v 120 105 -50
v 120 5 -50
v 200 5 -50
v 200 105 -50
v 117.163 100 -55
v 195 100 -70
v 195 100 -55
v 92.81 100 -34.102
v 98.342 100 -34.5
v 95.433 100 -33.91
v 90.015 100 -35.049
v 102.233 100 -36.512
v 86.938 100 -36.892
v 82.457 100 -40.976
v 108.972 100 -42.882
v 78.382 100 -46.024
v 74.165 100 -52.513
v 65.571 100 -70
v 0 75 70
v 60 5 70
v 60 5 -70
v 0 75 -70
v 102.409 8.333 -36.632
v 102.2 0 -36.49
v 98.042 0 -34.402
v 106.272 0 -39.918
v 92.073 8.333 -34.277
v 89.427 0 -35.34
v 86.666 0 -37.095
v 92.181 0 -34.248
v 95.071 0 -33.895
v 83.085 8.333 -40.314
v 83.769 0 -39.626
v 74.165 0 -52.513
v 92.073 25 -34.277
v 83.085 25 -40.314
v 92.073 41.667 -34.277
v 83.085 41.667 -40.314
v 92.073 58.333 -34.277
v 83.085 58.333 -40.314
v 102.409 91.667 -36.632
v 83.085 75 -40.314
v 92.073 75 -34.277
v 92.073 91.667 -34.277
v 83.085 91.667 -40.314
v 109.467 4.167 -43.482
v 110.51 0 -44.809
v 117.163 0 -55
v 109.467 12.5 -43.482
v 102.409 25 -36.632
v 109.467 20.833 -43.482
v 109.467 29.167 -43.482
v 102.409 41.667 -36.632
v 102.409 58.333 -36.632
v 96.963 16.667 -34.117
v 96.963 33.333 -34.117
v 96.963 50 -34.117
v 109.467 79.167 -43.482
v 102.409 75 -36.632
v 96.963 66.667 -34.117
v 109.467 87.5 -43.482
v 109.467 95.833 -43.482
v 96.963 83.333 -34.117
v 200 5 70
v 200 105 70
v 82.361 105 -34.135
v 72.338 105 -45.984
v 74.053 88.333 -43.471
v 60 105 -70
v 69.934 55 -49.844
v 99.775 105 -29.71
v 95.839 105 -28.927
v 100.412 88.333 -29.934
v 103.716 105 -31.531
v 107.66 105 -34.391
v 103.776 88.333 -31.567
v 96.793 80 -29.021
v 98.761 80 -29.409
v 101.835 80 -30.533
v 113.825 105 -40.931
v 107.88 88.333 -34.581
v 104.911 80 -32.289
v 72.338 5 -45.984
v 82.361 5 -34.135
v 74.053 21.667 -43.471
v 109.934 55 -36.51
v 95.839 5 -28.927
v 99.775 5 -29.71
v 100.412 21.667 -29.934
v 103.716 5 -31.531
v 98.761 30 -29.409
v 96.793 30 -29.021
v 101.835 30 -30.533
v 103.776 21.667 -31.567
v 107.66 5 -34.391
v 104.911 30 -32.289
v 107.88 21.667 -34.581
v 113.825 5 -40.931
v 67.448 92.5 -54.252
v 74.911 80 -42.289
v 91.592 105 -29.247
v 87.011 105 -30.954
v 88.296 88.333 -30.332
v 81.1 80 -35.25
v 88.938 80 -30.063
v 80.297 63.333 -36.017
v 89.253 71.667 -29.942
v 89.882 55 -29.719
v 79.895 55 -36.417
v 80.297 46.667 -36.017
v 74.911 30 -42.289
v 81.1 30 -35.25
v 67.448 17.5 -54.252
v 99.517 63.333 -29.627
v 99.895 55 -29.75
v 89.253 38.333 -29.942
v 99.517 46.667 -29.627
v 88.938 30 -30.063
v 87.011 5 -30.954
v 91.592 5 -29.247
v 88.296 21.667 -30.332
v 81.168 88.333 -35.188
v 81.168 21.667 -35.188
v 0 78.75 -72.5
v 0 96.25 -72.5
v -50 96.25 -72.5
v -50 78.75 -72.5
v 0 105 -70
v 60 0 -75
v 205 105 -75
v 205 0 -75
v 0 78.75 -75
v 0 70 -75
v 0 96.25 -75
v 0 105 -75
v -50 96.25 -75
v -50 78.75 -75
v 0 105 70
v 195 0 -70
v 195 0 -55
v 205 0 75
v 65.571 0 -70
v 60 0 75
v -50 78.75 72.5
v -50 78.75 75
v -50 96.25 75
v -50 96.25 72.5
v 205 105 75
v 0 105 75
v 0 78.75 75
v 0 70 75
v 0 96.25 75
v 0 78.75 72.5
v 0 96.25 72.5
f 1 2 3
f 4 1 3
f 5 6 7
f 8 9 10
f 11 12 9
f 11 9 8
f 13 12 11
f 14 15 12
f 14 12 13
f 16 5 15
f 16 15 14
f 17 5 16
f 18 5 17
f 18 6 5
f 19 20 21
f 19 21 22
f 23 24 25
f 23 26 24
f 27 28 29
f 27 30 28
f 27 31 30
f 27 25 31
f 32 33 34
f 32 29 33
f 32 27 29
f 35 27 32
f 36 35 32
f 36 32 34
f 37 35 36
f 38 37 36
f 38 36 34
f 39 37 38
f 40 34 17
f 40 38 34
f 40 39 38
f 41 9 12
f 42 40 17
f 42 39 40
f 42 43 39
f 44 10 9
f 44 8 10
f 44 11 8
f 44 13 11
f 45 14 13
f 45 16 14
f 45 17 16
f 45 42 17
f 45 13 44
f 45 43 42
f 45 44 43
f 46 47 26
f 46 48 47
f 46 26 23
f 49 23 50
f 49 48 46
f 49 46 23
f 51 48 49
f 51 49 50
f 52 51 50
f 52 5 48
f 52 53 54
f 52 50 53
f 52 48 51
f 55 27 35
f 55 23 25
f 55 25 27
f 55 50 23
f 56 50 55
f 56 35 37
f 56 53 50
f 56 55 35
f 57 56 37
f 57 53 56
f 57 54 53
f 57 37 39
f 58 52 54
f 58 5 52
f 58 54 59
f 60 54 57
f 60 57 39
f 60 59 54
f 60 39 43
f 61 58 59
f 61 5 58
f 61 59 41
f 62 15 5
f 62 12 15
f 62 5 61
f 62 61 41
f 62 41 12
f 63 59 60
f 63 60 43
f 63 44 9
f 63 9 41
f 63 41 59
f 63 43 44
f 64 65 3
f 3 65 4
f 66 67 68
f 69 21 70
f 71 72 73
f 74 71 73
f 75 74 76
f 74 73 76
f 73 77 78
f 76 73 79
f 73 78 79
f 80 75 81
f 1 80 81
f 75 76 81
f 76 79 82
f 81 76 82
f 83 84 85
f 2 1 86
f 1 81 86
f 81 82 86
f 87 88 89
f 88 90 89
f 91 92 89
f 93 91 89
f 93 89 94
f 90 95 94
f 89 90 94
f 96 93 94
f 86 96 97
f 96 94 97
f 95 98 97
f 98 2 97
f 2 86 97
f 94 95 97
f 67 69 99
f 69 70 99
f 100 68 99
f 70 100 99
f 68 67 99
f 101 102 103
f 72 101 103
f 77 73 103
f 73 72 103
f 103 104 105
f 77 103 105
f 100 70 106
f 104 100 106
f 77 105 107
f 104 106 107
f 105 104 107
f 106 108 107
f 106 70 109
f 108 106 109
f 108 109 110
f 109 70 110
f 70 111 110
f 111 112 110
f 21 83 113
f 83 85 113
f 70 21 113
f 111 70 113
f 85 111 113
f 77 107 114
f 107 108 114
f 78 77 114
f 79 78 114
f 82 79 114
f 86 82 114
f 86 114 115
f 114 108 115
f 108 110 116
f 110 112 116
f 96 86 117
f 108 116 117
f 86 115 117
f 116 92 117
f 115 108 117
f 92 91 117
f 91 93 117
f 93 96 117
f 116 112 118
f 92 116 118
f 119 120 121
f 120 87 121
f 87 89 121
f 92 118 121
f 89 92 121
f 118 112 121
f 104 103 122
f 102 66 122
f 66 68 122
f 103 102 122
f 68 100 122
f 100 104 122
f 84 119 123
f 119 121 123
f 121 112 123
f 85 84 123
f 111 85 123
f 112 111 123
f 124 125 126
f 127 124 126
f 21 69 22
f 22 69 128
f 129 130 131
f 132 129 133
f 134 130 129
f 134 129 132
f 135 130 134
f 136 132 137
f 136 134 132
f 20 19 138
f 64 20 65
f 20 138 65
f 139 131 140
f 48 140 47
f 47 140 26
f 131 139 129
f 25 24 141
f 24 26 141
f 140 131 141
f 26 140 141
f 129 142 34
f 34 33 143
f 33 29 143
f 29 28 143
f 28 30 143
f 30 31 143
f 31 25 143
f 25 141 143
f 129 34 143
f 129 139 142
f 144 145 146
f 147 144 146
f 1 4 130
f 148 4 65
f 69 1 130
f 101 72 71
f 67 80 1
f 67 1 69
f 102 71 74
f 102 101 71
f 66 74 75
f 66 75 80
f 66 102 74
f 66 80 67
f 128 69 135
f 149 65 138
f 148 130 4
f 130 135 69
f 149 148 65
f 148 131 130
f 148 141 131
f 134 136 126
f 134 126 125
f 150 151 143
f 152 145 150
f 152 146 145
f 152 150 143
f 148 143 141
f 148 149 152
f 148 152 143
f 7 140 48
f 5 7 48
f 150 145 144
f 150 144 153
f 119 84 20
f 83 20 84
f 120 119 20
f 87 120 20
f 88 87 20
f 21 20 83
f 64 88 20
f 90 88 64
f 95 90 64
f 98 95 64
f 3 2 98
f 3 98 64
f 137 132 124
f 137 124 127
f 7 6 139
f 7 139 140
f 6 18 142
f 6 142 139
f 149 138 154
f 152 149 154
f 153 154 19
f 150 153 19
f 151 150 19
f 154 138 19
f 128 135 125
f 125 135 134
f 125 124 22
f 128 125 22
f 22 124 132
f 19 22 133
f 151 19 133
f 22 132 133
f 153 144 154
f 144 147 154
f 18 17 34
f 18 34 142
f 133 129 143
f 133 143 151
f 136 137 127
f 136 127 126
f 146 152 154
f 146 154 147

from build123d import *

# Parameters (mm, degrees)
SALIENTE_EXTRUIR1_DEPTH    = 105
SALIENTE_EXTRUIR2_DEPTH    = 5
CROQUIS3_W                 = 140
CROQUIS3_H                 = 105
SALIENTE_EXTRUIR3_DEPTH    = 5
CROQUIS4_W                 = 205
CROQUIS4_H                 = 105
SALIENTE_EXTRUIR5_DEPTH    = 5
CROQUIS5_W                 = 205
CROQUIS5_H                 = 105
SALIENTE_EXTRUIR6_DEPTH    = 5
SALIENTE_EXTRUIR7_DEPTH    = 140
CORTAR_EXTRUIR1_DEPTH      = 273.167228172
CORTAR_EXTRUIR1_DEPTH_BACK = 273.167228172
CROQUIS9_W                 = 70
CROQUIS9_H                 = 17.5
SALIENTE_EXTRUIR8_DEPTH    = 2.5
CROQUIS10_W                = 70
CROQUIS10_H                = 17.5
SALIENTE_EXTRUIR9_DEPTH    = 2.5
CORTAR_EXTRUIR2_START      = -5
CORTAR_EXTRUIR2_DEPTH      = 140


with BuildPart() as part:
    # Croquis2 → Saliente-Extruir1 (new body)
    with BuildSketch(Plane(origin=(0, 0, 0), x_dir=(1, 0, 0), z_dir=(0, 1, 0))):
        with BuildLine():
            Line((120, 70), (60, 70))
            add(Edge.make_bspline(
                [(60, 70), (89.76394683, -0.562785514), (120, 50)],
                knots=[0, 0, 0, 1, 1, 1], degree=2))
            Line((120, 50), (200, 50))
            Line((200, 50), (200, 70))
            Line((200, 70), (120, 70))
        make_face()
    extrude(amount=SALIENTE_EXTRUIR1_DEPTH)

    # Croquis2<3> → Saliente-Extruir2 (add)
    with BuildSketch(Plane(origin=(0, 0, 0), x_dir=(1, 0, 0), z_dir=(0, 1, 0))):
        with BuildLine():
            Line((60, 70), (60, -70))
            Line((60, -70), (200, -70))
            Line((200, -70), (200, 50))
            Line((200, 50), (120, 50))
            add(Edge.make_bspline(
                [(60, 70), (89.76394683, -0.562785514), (120, 50)],
                knots=[0, 0, 0, 1, 1, 1], degree=2))
        make_face()
    extrude(amount=SALIENTE_EXTRUIR2_DEPTH)

    # Croquis3 → Saliente-Extruir3 (add)
    with BuildSketch(Plane(origin=(200, 0, 0), x_dir=(0, 0, -1), z_dir=(1, 0, 0))):
        with Locations((0, 52.5)):
            Rectangle(CROQUIS3_W, CROQUIS3_H)
    extrude(amount=SALIENTE_EXTRUIR3_DEPTH)

    # Croquis4 → Saliente-Extruir5 (add)
    with BuildSketch(Plane.XY.offset(70)):
        with Locations((102.5, 52.5)):
            Rectangle(CROQUIS4_W, CROQUIS4_H)
    extrude(amount=SALIENTE_EXTRUIR5_DEPTH)

    # Croquis5 → Saliente-Extruir6 (add)
    with BuildSketch(Plane(origin=(0, 0, -70), x_dir=(-1, 0, 0), z_dir=(0, 0, -1))):
        with Locations((-102.5, 52.5)):
            Rectangle(CROQUIS5_W, CROQUIS5_H)
    extrude(amount=SALIENTE_EXTRUIR6_DEPTH)

    # Croquis6 → Saliente-Extruir7 (add)
    with BuildSketch(Plane.XY.offset(-70)):
        Polygon((60, 5), (0, 75), (0, 70), (60, 0), align=None)
    extrude(amount=SALIENTE_EXTRUIR7_DEPTH)

    # Croquis8 → Cortar-Extruir1 (cut, two sides: drawn at the far end of the back side and taken through both)
    with BuildSketch(Plane.XY.offset(-70).offset(-CORTAR_EXTRUIR1_DEPTH_BACK)):
        Polygon((60, 0), (0, 70), (0, 0), align=None)
    extrude(amount=CORTAR_EXTRUIR1_DEPTH + CORTAR_EXTRUIR1_DEPTH_BACK, mode=Mode.SUBTRACT)

    # Croquis9 → Saliente-Extruir8 (add)
    with BuildSketch(Plane.XY.offset(75)):
        with Locations((-15, 87.5)):
            Rectangle(CROQUIS9_W, CROQUIS9_H)
    extrude(amount=-SALIENTE_EXTRUIR8_DEPTH)

    # Croquis10 → Saliente-Extruir9 (add)
    with BuildSketch(Plane(origin=(0, 0, -75), x_dir=(-1, 0, 0), z_dir=(0, 0, -1))):
        with Locations((15, 87.5)):
            Rectangle(CROQUIS10_W, CROQUIS10_H)
    extrude(amount=-SALIENTE_EXTRUIR9_DEPTH)

    # Croquis11 → Cortar-Extruir2 (cut)
    with BuildSketch(Plane(origin=(0, 105, 0), x_dir=(1, 0, 0), z_dir=(0, 1, 0)).offset(CORTAR_EXTRUIR2_START)):
        with BuildLine():
            Line((65.571134008, 70), (195, 70))
            Line((195, 70), (195, 55))
            Line((195, 55), (117.1633318, 55))
            add(Edge.make_bspline(
                [(117.1633318, 55), (116.553479191, 53.981059511), (115.34399458, 51.951404655), (113.624065501, 49.181454683), (110.189825419, 44.210450859), (105.056898876, 38.454652942), (100.423455416, 35.264929664), (97.501660631, 34.185491141), (95.327997633, 33.847005409), (93.19350491, 33.972145162), (90.391223635, 34.735002625), (85.948013808, 37.366168652), (78.790008493, 44.736062985), (74.164523658, 52.513426841)],
                knots=[-0.028793704, -0.028793704, -0.028793704, -0.004727786, 0.019338133, 0.06746997, 0.163733644, 0.292085209, 0.388348883, 0.452524666, 0.516700448, 0.580876231, 0.677139905, 0.80549147, 0.998018818, 0.998018818, 0.998018818], degree=2))
            Line((74.164523658, 52.513426841), (65.571134008, 70))
        make_face()
    extrude(amount=-CORTAR_EXTRUIR2_DEPTH, mode=Mode.SUBTRACT)


solid = part.part
